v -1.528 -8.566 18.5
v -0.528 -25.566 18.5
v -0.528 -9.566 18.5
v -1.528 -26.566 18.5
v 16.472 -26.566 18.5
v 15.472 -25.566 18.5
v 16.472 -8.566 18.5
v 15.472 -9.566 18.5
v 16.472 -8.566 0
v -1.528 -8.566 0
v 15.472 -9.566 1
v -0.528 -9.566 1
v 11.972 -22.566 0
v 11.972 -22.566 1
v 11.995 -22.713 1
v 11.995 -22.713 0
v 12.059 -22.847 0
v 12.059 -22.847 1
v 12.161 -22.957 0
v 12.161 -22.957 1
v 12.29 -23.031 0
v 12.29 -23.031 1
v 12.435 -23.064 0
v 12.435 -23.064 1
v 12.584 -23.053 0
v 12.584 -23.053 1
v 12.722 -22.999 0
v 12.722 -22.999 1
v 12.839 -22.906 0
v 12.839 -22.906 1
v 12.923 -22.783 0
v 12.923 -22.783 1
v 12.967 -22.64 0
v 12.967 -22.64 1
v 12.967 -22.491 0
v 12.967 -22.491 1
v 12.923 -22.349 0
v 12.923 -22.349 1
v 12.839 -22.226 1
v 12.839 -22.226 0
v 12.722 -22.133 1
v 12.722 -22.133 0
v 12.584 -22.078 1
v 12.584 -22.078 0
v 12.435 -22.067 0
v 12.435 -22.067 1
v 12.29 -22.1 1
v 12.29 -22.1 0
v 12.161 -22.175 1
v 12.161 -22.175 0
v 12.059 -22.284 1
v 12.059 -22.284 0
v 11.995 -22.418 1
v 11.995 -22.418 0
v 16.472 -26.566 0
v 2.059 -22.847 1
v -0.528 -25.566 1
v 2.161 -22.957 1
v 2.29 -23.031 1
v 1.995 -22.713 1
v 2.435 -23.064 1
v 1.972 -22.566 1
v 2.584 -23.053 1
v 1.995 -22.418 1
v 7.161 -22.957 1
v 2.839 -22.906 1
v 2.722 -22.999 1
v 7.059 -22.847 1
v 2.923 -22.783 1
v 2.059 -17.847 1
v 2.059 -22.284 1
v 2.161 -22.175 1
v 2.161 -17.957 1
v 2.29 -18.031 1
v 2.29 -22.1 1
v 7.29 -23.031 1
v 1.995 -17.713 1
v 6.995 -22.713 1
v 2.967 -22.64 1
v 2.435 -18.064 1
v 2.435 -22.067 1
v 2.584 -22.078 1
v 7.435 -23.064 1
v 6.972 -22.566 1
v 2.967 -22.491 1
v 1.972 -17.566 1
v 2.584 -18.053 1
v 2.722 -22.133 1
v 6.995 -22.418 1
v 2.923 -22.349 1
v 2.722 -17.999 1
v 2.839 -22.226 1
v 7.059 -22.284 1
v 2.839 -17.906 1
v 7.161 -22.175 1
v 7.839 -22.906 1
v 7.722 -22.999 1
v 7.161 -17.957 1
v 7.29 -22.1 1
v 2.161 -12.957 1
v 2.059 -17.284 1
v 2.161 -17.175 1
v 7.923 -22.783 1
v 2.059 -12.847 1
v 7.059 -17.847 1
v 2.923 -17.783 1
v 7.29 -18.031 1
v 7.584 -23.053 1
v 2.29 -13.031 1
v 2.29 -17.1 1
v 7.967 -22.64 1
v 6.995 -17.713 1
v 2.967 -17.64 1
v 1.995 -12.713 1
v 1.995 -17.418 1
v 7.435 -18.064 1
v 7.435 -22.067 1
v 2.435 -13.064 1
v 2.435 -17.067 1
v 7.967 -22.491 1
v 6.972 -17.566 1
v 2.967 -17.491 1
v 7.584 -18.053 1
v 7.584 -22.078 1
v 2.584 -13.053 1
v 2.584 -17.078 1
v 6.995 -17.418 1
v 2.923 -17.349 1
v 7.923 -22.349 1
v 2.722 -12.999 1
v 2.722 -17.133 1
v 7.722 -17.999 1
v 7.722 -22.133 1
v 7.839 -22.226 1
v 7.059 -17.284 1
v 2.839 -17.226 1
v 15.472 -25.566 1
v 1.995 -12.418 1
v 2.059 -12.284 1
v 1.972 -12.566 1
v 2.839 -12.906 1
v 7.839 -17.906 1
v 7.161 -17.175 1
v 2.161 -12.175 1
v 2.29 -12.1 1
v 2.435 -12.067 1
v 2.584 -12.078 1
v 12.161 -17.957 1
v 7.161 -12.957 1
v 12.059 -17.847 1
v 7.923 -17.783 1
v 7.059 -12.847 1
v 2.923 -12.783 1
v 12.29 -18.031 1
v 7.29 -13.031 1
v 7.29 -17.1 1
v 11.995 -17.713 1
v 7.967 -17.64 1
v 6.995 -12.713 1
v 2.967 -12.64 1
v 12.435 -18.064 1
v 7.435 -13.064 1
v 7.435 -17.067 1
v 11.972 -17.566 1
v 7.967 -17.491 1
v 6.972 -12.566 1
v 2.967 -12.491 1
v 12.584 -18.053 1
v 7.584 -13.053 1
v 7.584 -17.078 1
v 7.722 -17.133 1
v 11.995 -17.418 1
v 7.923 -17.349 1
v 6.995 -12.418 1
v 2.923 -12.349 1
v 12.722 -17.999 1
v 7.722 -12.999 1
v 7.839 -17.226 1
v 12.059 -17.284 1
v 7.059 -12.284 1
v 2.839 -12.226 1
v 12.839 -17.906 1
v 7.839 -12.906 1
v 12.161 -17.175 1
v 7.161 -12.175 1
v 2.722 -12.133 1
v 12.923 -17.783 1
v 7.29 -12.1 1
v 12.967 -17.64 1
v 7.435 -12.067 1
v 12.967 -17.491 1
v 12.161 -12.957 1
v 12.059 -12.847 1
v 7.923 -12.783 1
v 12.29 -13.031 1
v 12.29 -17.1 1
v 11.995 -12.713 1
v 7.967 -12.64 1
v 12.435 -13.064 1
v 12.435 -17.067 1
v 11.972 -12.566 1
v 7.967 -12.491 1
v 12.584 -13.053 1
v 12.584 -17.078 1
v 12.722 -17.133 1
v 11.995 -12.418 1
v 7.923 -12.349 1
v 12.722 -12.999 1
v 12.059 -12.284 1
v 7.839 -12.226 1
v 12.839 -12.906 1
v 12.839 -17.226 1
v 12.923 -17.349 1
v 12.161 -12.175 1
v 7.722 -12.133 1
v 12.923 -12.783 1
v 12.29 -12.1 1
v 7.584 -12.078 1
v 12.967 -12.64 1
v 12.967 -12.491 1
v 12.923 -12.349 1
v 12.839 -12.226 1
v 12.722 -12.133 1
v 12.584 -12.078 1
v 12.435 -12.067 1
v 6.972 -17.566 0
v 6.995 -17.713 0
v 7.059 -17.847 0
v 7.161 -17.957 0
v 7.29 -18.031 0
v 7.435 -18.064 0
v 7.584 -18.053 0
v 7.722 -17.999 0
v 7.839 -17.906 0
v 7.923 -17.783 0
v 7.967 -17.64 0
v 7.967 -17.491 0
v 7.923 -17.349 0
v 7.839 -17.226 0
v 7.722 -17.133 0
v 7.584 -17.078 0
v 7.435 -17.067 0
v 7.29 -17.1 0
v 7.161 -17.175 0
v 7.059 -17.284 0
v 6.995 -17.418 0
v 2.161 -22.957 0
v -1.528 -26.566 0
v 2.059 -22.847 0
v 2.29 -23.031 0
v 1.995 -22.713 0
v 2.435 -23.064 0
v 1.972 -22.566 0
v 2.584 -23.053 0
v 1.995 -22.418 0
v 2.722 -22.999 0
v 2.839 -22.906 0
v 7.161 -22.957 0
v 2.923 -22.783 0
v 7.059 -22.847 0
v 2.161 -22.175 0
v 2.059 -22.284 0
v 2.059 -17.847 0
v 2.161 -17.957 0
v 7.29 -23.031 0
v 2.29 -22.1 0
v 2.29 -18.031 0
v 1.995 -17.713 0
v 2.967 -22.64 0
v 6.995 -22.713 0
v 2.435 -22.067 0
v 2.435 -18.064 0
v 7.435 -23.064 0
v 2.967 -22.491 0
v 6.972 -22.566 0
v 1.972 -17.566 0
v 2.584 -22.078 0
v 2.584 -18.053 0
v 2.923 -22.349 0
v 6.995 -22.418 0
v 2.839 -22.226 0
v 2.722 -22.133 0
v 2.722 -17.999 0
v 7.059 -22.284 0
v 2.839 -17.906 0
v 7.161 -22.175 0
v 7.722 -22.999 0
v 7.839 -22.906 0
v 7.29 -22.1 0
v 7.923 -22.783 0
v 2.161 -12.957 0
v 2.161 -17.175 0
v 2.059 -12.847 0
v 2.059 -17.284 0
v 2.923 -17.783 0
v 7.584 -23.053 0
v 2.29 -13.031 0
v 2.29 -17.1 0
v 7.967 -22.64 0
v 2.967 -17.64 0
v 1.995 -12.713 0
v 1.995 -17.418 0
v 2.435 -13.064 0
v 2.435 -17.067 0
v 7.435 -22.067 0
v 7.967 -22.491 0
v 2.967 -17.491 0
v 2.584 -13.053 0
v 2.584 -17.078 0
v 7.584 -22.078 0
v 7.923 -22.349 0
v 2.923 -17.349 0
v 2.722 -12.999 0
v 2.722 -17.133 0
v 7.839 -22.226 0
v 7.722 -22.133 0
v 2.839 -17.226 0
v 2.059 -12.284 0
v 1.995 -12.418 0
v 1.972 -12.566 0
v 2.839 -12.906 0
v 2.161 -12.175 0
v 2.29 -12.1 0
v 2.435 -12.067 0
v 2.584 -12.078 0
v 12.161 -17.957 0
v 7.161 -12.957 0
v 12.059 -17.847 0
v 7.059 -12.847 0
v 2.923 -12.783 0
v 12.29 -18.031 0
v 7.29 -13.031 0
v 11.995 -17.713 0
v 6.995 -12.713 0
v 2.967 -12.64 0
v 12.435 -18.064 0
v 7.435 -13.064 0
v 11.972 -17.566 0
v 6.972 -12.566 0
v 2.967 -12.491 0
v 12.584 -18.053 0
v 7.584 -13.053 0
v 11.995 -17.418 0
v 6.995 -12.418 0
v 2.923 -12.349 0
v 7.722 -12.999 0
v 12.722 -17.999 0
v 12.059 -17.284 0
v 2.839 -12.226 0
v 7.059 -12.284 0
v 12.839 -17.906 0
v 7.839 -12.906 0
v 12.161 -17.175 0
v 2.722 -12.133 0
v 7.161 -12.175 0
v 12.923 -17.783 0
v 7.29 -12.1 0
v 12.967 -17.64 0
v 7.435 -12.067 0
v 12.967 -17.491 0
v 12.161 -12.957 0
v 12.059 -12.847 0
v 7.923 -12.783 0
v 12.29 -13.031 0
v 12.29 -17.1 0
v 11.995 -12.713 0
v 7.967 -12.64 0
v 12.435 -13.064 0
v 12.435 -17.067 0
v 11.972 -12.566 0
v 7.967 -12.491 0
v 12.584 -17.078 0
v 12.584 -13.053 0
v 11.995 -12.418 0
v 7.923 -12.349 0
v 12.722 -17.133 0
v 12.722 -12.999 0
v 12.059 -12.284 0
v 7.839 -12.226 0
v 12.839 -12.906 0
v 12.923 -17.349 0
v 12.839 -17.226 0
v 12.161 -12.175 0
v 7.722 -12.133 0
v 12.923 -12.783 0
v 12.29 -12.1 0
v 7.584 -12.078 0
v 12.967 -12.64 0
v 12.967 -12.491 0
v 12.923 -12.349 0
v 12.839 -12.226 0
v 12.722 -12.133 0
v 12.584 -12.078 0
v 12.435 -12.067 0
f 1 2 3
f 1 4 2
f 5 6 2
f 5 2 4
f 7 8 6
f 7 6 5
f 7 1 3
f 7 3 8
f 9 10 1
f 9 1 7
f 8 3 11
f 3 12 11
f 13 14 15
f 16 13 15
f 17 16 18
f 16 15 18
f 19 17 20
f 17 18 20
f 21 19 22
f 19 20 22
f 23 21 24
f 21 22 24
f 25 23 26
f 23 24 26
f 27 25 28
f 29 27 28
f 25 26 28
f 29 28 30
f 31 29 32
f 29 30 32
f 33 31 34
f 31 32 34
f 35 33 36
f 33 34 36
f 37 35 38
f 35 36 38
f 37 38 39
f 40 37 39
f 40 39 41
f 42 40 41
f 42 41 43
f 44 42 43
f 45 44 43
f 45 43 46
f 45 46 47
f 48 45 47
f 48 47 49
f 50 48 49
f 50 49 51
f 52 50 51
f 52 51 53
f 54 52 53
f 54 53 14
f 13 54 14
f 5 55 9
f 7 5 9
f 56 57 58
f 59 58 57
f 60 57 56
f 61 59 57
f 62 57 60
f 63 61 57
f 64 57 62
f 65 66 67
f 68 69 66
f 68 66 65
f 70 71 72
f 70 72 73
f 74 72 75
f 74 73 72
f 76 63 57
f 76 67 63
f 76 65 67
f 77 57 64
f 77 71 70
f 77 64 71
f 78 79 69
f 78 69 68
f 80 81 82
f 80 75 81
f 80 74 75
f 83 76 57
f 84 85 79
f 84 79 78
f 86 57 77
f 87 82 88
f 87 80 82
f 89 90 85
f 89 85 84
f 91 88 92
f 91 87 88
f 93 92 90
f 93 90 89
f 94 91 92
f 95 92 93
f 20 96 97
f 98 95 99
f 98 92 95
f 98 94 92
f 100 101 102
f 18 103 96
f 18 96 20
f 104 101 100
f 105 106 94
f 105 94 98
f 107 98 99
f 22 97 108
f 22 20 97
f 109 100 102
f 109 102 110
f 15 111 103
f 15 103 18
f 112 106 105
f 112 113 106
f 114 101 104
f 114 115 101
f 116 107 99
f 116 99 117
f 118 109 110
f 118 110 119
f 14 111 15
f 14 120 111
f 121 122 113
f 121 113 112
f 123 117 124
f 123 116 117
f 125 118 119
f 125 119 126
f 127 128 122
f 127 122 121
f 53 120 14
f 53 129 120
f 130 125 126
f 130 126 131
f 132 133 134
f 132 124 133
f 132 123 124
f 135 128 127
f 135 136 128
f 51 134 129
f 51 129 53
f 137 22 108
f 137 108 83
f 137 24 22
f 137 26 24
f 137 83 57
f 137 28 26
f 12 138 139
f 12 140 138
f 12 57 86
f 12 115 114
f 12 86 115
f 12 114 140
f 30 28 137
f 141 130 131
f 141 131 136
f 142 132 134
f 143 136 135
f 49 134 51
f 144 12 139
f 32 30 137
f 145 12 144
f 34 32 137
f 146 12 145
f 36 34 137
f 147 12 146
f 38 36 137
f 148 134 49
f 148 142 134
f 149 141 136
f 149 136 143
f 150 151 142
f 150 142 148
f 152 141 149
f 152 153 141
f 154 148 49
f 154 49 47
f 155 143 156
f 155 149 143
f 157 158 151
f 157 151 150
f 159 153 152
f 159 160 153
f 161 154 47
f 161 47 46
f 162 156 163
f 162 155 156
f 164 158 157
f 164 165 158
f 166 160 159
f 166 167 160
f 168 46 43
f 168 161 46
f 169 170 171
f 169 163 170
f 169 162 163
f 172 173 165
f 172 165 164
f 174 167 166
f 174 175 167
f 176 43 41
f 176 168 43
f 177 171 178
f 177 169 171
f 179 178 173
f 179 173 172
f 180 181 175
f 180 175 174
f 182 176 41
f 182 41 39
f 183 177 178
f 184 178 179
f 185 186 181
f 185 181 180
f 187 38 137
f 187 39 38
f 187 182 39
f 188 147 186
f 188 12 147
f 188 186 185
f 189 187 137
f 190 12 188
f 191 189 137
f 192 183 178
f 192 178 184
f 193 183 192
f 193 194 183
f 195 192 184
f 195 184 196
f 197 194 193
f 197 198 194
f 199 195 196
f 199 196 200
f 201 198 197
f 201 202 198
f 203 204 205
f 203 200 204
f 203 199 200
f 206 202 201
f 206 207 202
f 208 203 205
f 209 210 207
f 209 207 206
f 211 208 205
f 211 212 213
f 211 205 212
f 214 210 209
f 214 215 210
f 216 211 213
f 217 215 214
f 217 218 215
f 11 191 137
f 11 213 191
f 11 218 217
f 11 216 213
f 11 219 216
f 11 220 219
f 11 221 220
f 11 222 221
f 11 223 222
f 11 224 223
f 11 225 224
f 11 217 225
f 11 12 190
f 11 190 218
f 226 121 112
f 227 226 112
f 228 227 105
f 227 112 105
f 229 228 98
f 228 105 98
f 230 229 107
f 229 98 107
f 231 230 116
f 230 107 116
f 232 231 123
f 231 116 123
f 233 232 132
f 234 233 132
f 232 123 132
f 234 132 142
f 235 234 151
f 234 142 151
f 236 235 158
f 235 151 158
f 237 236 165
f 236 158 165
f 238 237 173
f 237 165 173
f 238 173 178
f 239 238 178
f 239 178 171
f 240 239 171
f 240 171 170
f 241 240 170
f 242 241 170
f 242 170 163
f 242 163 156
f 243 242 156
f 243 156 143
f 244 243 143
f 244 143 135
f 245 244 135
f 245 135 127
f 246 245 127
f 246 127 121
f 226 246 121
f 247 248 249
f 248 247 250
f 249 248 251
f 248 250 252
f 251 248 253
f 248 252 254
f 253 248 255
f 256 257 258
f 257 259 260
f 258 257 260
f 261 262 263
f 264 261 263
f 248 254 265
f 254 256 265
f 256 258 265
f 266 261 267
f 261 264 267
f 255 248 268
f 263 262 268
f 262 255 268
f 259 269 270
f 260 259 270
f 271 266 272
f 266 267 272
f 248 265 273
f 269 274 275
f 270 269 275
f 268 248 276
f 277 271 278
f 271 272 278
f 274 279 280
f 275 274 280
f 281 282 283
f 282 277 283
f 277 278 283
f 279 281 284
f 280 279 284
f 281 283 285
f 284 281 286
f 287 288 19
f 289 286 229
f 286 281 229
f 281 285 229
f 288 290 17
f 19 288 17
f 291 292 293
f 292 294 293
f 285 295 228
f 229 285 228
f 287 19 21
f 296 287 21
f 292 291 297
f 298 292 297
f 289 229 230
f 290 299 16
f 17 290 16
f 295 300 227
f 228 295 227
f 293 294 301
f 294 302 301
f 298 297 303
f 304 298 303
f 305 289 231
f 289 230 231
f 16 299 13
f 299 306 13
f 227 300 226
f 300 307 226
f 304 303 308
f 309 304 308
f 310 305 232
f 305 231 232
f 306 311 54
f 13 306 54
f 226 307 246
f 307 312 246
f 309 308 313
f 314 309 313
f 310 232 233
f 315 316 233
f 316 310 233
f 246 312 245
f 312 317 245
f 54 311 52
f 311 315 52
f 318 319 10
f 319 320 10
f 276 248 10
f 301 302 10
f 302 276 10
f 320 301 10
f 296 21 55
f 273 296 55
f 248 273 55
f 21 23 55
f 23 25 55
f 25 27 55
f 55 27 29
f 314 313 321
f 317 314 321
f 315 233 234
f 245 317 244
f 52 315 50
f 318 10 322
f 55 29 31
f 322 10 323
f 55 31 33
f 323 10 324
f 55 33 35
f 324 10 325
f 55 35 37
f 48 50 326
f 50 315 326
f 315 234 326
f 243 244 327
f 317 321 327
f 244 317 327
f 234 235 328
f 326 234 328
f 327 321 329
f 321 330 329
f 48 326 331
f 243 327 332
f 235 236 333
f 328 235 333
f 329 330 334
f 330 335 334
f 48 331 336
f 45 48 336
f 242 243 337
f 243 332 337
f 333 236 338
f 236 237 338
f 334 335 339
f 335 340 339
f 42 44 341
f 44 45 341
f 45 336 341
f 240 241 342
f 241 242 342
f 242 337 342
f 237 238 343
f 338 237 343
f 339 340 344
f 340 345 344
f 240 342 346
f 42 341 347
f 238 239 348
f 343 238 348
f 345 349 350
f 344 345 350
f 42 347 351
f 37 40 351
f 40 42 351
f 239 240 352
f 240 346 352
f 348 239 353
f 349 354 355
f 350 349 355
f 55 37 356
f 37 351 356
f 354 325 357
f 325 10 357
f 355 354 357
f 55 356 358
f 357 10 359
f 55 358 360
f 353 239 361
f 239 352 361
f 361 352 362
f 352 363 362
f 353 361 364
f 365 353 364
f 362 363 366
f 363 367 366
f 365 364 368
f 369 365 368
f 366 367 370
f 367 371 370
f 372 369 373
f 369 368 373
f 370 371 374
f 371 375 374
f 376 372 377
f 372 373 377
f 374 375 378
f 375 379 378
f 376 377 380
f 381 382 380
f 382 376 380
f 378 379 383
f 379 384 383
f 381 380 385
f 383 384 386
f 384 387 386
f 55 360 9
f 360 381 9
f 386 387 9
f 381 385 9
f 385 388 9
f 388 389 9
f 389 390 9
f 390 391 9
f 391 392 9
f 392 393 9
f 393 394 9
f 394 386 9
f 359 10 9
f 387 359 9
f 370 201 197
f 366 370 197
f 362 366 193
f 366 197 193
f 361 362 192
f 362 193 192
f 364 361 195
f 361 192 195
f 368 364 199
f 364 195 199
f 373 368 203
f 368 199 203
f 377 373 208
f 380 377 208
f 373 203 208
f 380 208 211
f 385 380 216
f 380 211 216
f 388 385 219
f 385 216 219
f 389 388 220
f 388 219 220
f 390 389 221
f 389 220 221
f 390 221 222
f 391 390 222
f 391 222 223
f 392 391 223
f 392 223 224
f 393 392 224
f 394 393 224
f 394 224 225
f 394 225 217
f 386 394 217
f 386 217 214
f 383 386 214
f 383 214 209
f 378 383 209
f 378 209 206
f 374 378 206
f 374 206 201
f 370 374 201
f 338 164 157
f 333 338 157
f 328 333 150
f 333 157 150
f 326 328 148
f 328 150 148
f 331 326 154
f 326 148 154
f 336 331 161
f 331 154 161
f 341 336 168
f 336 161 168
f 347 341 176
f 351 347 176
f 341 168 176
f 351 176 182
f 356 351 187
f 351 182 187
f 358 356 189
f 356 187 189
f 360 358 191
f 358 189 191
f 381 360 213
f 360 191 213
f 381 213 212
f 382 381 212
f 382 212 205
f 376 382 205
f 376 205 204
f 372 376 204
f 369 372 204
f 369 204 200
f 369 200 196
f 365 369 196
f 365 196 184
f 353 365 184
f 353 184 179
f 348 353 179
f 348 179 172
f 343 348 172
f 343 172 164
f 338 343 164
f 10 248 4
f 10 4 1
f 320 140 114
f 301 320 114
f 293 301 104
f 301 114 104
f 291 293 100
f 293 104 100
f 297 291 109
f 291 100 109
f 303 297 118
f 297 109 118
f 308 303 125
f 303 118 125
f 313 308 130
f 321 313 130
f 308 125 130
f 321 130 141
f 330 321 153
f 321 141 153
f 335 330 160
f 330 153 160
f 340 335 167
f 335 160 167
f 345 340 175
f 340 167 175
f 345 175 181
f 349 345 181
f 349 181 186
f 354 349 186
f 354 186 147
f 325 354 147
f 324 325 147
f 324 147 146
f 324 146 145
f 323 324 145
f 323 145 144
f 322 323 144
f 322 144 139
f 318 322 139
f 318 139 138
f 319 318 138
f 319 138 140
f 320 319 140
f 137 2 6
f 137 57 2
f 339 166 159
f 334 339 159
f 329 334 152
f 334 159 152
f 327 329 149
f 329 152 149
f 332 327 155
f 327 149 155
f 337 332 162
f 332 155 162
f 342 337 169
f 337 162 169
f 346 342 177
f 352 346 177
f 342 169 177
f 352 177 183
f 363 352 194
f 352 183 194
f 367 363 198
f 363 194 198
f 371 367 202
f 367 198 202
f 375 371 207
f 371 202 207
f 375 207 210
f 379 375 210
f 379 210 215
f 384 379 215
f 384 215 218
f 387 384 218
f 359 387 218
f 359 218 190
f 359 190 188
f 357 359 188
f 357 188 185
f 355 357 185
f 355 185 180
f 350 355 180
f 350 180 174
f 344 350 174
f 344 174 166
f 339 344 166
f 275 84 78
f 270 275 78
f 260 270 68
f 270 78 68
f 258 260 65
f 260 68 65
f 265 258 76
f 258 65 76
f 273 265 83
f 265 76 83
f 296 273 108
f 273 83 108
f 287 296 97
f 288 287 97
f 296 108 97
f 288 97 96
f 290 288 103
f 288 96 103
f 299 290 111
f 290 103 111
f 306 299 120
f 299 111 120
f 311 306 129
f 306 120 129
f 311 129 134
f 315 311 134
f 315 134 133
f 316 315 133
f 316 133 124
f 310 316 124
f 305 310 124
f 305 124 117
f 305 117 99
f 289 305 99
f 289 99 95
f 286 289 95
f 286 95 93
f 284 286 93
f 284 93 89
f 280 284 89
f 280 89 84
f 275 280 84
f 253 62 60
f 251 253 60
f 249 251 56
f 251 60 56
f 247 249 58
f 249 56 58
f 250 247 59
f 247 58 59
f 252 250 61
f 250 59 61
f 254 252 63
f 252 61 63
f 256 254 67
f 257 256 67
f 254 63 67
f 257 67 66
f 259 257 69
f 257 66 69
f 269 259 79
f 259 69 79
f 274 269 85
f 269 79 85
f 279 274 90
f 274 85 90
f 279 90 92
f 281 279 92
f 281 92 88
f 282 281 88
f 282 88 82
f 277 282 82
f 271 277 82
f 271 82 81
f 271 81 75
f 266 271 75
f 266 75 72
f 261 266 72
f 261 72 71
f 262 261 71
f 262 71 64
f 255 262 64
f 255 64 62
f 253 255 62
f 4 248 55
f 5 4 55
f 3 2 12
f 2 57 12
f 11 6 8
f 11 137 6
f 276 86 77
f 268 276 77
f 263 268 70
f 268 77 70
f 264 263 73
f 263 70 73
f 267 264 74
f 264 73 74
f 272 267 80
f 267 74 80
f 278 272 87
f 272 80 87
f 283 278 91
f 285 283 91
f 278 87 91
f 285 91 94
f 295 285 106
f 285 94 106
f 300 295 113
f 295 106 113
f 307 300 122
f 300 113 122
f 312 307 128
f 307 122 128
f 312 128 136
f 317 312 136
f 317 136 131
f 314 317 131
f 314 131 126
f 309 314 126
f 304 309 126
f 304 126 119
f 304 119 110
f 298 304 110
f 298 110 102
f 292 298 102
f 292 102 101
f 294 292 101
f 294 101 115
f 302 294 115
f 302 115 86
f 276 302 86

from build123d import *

# Parameters (mm, degrees)
F0_W     = 18
F0_H     = 18
F1_DEPTH = 18.5
F2_T     = -1
F4_D     = 1


with BuildPart() as f1:
    # F0 (on Top) → F1 (new body)
    with BuildSketch(Plane.XY):
        with Locations((7.472297, -17.565783)):
            Rectangle(F0_W, F0_H)
    extrude(amount=F1_DEPTH)

    # F2
    f2_openings = [f1.faces().sort_by_distance(p)[0] for p in [
        (7.472297, -17.565783, 18.5),
    ]]
    offset(amount=F2_T, openings=f2_openings)

    # F4 (through all)
    with Locations(Plane(origin=(0, 0, 0), x_dir=(1, 0, 0), z_dir=(0, 0, -1))):
        with Locations((12.472297, 22.565783), (7.472297, 17.565783), (2.472297, 12.565783), (7.472297, 12.565783), (12.472297, 12.565783), (12.472297, 17.565783), (2.472297, 17.565783), (2.472297, 22.565783), (7.472297, 22.565783)):
            Hole(F4_D / 2)


solid = f1.part
